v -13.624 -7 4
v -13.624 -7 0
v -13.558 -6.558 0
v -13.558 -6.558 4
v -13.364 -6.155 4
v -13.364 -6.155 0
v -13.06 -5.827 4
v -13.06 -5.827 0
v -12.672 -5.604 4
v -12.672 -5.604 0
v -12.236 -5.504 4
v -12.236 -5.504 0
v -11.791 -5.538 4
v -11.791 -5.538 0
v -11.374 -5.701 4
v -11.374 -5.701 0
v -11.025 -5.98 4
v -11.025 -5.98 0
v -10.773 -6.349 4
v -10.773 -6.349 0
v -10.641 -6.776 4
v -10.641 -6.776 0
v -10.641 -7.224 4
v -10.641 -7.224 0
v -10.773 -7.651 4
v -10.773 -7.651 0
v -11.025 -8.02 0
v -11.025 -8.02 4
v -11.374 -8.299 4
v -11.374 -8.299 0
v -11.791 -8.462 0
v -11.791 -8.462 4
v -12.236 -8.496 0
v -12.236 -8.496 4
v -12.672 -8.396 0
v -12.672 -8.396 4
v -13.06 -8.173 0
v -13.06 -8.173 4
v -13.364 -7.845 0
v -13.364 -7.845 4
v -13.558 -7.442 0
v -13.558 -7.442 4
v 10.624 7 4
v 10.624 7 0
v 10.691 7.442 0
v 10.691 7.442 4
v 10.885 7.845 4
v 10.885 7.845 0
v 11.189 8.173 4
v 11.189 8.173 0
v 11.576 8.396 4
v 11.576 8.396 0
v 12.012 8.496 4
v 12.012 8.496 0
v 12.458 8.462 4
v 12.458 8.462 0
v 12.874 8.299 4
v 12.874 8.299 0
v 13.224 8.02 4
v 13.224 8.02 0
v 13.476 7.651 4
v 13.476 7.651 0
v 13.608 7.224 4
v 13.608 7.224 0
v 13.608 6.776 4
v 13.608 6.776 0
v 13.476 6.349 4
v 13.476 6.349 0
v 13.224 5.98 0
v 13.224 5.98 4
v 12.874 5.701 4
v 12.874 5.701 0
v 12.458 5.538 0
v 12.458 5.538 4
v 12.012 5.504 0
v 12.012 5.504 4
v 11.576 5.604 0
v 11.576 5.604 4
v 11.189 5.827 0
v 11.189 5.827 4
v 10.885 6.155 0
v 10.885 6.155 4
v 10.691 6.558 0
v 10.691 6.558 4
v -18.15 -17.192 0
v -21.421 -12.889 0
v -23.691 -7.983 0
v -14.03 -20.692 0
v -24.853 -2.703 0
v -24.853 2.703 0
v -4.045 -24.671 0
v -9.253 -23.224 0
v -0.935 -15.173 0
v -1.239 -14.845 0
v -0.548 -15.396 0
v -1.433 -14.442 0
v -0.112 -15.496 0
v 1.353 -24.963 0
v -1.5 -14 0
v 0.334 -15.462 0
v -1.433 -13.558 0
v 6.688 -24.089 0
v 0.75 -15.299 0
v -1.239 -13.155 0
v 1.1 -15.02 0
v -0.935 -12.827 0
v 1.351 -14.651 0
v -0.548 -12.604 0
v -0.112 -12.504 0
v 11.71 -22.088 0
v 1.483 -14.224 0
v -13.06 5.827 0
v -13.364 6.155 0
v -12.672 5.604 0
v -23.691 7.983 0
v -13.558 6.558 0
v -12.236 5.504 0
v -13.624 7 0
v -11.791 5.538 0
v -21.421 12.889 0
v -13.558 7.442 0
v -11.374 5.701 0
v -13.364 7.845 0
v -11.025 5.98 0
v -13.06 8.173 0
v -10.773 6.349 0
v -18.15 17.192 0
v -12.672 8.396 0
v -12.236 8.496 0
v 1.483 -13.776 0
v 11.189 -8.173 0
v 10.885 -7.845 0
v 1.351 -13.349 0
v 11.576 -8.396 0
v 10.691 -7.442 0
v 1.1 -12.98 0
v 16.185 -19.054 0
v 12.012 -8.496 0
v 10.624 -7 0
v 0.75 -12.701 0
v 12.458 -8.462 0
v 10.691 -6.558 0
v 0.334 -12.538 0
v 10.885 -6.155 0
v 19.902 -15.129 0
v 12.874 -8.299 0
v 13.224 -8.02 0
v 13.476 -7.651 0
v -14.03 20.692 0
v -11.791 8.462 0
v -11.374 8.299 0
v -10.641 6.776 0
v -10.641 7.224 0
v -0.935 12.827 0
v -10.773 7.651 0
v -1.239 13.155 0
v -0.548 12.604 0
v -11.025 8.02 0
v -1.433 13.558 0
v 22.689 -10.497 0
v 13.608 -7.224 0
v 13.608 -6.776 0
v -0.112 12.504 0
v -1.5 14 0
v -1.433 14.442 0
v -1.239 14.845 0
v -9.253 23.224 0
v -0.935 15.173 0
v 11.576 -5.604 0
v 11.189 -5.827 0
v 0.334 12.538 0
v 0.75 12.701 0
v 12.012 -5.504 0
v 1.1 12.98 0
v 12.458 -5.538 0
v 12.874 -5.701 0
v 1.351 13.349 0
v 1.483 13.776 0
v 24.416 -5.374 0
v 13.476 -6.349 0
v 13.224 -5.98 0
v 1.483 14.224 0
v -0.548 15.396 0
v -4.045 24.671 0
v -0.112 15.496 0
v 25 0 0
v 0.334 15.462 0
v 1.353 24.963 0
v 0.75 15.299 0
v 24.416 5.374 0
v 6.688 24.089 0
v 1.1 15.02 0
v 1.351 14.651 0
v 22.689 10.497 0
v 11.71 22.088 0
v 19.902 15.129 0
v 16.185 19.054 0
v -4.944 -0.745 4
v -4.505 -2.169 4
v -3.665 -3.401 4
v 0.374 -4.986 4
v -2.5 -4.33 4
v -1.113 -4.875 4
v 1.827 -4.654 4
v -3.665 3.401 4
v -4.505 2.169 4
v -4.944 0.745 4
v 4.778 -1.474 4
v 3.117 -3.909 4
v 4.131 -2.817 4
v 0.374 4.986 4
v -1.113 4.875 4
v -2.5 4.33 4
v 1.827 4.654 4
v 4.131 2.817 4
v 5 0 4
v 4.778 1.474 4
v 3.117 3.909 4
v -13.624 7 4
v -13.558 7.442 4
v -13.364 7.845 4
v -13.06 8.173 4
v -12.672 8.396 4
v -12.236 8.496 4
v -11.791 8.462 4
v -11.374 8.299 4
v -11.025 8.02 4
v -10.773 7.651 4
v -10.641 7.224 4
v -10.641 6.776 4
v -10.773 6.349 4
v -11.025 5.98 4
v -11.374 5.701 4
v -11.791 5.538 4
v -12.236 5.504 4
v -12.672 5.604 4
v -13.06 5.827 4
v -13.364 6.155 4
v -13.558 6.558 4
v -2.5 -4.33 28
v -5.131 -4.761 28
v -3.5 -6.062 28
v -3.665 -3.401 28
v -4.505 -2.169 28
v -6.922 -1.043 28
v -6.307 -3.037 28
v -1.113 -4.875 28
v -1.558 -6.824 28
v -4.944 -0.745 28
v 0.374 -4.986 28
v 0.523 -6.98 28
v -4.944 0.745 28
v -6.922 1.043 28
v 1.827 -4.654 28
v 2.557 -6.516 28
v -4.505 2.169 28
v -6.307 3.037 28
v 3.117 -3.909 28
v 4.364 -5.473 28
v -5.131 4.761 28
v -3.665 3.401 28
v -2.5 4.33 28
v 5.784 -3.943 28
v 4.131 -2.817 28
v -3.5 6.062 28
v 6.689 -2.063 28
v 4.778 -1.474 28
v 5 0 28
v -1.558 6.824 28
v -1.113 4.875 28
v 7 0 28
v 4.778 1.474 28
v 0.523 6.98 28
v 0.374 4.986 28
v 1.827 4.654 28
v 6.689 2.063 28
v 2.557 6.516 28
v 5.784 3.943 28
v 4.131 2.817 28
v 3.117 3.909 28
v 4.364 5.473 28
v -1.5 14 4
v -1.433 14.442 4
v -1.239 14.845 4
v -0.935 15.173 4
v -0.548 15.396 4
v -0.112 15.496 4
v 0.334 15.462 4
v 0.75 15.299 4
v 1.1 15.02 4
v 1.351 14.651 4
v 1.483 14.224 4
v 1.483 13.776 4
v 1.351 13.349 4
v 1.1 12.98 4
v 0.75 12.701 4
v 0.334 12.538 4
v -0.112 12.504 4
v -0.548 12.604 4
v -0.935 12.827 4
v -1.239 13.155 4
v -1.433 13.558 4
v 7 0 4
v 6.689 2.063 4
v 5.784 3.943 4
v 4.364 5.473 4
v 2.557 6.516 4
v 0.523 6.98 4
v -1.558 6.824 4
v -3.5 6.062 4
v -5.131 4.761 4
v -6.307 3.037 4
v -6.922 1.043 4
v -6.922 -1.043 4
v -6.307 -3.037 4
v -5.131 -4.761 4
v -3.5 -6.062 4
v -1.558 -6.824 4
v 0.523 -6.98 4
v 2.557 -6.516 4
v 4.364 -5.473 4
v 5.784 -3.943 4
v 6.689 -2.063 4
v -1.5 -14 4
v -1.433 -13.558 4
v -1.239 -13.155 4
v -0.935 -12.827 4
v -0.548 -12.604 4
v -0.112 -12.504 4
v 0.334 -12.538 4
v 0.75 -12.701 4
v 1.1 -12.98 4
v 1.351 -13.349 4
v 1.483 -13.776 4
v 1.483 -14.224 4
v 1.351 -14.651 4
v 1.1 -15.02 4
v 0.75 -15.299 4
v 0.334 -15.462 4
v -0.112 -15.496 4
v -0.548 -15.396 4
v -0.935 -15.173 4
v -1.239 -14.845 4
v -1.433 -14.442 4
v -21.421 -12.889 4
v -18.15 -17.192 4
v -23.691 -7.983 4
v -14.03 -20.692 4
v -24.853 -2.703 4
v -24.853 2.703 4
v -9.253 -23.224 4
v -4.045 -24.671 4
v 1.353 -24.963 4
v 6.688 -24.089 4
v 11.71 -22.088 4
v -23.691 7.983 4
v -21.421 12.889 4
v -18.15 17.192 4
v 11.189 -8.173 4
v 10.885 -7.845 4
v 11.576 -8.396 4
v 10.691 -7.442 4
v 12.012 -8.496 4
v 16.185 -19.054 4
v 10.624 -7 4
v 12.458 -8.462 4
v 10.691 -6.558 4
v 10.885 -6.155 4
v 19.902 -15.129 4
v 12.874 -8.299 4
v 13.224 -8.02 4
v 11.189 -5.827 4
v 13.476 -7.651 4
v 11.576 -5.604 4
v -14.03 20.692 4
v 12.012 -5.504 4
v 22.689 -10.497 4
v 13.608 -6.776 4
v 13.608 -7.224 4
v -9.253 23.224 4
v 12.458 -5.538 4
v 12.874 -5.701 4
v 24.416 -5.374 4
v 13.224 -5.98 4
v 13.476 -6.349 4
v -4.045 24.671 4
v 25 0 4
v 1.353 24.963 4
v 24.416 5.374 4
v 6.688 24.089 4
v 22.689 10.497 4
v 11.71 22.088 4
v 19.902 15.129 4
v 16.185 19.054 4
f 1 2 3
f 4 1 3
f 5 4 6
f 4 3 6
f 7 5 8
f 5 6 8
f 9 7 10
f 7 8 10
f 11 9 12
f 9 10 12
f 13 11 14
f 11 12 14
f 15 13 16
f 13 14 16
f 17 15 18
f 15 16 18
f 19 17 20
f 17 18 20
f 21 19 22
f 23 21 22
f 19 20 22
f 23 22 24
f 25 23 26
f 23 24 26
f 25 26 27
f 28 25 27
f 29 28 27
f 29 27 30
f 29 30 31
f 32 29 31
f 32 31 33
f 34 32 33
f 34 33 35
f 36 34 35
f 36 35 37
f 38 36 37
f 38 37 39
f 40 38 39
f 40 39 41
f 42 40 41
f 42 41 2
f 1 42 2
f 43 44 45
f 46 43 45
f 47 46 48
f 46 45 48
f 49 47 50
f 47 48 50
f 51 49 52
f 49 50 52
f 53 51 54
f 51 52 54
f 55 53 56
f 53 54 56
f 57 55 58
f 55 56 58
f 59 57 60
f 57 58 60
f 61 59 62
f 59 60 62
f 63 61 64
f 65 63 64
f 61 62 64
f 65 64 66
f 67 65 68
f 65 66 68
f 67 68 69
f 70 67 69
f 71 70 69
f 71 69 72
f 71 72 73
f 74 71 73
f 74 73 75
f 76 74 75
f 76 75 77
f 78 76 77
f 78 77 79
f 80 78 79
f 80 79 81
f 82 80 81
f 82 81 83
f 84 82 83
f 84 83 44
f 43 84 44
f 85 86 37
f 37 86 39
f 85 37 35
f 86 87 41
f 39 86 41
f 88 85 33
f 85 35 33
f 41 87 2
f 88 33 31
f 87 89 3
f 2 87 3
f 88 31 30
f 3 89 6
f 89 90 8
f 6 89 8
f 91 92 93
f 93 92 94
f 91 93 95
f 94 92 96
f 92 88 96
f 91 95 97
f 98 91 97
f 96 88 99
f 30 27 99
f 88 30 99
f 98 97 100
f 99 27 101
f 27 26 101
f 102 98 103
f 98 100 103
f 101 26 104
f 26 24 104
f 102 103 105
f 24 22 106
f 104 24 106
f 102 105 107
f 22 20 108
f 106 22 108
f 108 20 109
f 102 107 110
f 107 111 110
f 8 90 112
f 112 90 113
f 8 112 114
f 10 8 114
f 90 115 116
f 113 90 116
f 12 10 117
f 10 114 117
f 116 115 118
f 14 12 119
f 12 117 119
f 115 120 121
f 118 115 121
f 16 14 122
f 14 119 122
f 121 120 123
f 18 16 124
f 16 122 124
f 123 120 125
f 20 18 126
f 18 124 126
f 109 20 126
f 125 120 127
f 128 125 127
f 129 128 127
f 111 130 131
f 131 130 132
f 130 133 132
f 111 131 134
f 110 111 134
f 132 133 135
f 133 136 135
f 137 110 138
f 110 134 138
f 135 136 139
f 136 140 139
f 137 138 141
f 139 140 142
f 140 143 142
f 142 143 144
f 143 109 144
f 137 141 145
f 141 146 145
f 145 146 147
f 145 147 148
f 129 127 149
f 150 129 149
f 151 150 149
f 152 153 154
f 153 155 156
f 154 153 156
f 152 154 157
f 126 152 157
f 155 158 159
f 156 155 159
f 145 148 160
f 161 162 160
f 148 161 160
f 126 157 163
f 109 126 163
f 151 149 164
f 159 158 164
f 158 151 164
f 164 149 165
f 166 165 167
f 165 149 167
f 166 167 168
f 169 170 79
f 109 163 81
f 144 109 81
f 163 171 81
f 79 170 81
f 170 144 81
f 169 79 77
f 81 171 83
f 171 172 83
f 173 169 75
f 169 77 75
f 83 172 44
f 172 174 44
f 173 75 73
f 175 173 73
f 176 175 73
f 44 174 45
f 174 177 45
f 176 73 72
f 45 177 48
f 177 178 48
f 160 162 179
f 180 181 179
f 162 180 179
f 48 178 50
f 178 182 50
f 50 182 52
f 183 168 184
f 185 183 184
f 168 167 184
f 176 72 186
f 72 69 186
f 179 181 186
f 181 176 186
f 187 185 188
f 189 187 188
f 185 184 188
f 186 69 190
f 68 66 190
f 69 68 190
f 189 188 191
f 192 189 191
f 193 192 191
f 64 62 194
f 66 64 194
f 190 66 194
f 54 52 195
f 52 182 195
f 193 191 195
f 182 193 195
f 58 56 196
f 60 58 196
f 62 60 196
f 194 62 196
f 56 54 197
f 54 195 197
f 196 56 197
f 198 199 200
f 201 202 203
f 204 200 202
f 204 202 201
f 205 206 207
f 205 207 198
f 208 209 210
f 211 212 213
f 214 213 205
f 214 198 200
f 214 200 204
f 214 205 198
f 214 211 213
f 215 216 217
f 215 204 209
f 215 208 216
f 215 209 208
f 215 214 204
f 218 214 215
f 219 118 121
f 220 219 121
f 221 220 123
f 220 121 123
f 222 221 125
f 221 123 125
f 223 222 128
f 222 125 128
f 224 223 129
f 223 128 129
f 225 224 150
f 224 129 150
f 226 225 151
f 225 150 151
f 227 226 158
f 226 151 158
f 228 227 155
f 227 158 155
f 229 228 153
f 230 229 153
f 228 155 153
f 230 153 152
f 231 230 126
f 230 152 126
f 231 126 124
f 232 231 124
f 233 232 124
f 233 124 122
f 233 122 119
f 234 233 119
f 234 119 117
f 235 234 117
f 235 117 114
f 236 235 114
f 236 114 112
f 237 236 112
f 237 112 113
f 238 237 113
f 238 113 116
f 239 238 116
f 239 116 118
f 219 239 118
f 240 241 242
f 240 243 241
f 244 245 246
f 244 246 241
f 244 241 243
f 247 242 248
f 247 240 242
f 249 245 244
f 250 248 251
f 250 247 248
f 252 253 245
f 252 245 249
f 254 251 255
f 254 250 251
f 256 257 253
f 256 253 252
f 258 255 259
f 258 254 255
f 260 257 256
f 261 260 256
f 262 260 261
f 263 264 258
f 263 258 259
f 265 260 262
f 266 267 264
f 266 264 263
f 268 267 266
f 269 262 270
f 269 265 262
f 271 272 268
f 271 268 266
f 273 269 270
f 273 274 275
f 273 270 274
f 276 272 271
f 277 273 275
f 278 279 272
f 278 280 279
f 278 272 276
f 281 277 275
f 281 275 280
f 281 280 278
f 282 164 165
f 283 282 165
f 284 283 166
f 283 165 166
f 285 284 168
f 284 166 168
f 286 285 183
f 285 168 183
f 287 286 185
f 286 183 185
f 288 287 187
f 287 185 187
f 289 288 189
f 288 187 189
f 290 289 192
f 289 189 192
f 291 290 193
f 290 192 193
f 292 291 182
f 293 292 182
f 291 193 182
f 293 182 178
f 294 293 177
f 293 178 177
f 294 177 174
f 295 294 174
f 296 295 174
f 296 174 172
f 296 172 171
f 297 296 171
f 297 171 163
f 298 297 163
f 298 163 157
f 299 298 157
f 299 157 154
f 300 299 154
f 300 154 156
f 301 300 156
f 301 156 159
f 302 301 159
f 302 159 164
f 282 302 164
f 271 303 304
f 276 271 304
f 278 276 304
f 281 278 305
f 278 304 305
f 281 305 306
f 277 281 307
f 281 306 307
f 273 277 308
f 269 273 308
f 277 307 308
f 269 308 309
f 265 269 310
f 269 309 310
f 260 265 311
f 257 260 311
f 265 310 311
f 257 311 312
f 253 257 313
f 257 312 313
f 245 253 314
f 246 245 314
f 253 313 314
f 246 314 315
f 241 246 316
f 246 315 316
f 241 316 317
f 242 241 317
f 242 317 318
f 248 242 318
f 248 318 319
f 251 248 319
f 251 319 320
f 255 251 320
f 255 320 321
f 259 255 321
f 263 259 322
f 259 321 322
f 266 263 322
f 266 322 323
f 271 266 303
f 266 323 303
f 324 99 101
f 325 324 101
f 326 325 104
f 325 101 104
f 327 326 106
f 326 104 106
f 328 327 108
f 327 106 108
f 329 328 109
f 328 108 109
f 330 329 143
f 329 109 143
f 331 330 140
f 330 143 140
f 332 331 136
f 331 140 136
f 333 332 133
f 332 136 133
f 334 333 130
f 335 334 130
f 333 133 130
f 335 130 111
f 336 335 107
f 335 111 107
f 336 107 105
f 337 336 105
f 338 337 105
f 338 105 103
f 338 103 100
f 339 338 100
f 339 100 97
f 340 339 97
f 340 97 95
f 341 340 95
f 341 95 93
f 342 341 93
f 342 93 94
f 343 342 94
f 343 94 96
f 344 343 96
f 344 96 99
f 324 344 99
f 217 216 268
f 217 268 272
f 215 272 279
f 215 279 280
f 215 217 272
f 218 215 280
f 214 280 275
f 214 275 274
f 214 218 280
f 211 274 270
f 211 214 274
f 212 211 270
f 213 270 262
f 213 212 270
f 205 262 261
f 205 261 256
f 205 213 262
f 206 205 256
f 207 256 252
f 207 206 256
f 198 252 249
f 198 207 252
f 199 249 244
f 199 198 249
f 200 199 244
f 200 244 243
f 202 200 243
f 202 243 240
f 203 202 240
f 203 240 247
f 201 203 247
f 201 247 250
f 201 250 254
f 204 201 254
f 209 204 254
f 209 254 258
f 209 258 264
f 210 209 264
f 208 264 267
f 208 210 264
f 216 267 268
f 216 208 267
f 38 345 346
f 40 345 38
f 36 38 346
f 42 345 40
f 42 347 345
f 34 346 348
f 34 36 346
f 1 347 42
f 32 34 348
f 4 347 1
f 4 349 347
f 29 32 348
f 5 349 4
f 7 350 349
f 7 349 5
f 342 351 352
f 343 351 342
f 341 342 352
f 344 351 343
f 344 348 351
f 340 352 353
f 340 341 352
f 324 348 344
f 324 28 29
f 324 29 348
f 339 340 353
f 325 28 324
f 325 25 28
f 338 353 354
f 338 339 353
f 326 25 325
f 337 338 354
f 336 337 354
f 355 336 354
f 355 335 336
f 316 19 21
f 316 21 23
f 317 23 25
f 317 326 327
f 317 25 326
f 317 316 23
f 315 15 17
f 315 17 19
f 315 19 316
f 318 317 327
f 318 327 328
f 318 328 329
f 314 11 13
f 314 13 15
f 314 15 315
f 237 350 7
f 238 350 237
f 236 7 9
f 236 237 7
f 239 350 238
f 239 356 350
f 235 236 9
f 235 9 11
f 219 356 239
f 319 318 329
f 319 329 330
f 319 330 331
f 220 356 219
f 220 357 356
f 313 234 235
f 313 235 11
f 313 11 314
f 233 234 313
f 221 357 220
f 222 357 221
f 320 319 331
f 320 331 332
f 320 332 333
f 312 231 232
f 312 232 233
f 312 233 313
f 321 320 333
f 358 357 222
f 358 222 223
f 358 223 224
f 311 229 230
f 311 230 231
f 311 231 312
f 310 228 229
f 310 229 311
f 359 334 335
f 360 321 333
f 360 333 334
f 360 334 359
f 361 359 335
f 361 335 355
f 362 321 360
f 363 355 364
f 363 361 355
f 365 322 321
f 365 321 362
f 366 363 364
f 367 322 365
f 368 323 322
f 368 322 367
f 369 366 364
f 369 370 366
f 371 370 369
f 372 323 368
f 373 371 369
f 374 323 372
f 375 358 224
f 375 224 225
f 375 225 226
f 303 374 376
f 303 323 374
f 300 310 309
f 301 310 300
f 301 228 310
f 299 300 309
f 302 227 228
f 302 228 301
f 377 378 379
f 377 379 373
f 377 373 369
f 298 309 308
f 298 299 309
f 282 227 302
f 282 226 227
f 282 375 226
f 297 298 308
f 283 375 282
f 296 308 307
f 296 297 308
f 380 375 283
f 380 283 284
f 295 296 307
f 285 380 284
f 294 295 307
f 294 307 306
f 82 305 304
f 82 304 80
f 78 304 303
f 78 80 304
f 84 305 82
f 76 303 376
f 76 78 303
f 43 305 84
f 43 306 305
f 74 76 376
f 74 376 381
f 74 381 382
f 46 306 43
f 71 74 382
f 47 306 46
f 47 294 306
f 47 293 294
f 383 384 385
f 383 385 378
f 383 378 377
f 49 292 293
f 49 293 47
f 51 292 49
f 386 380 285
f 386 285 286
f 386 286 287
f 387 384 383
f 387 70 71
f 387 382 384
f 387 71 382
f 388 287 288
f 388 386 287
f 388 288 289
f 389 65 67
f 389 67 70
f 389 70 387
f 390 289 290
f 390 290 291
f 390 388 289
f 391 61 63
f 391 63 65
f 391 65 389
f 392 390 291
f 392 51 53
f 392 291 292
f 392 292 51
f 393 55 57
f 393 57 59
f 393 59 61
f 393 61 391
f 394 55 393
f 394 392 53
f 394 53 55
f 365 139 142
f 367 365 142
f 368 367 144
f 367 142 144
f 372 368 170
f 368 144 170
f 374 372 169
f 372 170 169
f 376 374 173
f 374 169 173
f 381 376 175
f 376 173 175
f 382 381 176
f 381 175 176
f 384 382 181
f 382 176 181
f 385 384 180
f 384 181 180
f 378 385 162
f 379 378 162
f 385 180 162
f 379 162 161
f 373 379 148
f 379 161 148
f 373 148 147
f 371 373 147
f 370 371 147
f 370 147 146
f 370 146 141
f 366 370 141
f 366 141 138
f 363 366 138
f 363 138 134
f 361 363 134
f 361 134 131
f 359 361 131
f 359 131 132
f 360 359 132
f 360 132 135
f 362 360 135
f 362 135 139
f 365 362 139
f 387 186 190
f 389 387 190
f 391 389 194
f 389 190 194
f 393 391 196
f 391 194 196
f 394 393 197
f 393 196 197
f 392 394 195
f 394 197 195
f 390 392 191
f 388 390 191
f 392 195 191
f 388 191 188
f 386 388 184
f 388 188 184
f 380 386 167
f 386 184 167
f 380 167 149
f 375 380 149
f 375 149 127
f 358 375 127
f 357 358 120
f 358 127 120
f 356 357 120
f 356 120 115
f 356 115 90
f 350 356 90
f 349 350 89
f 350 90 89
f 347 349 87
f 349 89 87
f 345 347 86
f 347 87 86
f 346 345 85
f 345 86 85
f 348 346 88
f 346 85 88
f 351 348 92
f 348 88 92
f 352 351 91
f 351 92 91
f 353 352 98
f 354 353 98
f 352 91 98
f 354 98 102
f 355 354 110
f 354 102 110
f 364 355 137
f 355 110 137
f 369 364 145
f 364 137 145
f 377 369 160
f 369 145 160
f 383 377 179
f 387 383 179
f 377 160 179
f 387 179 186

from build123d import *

# Parameters (mm, degrees)
SKETCH1_R           = 25
BOSS_EXTRUDE1_DEPTH = 4
SKETCH2_R           = 7
SKETCH2_R_2         = 5
BOSS_EXTRUDE2_DEPTH = 24
SKETCH3_R           = 1.5
CUT_EXTRUDE1_DEPTH  = 24


with BuildPart() as part:
    # Sketch1 → Boss-Extrude1 (new body)
    with BuildSketch(Plane.XY):
        Circle(SKETCH1_R)
    extrude(amount=BOSS_EXTRUDE1_DEPTH)

    # Sketch2 → Boss-Extrude2 (add)
    with BuildSketch(Plane.XY.offset(4)):
        Circle(SKETCH2_R)
        Circle(SKETCH2_R_2, mode=Mode.SUBTRACT)
    extrude(amount=BOSS_EXTRUDE2_DEPTH)

    # Sketch3 → Cut-Extrude1 (cut)
    with BuildSketch(Plane(origin=(0, 0, 0), x_dir=(-1, 0, 0), z_dir=(0, 0, -1))):
        with Locations((0, 14)):
            Circle(SKETCH3_R)
        with Locations((12.124355653, 7)):
            Circle(SKETCH3_R)
        with Locations((12.124355653, -7)):
            Circle(SKETCH3_R)
        with Locations((0, -14)):
            Circle(SKETCH3_R)
        with Locations((-12.124355653, -7)):
            Circle(SKETCH3_R)
        with Locations((-12.124355653, 7)):
            Circle(SKETCH3_R)
    extrude(amount=-CUT_EXTRUDE1_DEPTH, mode=Mode.SUBTRACT)


solid = part.part
